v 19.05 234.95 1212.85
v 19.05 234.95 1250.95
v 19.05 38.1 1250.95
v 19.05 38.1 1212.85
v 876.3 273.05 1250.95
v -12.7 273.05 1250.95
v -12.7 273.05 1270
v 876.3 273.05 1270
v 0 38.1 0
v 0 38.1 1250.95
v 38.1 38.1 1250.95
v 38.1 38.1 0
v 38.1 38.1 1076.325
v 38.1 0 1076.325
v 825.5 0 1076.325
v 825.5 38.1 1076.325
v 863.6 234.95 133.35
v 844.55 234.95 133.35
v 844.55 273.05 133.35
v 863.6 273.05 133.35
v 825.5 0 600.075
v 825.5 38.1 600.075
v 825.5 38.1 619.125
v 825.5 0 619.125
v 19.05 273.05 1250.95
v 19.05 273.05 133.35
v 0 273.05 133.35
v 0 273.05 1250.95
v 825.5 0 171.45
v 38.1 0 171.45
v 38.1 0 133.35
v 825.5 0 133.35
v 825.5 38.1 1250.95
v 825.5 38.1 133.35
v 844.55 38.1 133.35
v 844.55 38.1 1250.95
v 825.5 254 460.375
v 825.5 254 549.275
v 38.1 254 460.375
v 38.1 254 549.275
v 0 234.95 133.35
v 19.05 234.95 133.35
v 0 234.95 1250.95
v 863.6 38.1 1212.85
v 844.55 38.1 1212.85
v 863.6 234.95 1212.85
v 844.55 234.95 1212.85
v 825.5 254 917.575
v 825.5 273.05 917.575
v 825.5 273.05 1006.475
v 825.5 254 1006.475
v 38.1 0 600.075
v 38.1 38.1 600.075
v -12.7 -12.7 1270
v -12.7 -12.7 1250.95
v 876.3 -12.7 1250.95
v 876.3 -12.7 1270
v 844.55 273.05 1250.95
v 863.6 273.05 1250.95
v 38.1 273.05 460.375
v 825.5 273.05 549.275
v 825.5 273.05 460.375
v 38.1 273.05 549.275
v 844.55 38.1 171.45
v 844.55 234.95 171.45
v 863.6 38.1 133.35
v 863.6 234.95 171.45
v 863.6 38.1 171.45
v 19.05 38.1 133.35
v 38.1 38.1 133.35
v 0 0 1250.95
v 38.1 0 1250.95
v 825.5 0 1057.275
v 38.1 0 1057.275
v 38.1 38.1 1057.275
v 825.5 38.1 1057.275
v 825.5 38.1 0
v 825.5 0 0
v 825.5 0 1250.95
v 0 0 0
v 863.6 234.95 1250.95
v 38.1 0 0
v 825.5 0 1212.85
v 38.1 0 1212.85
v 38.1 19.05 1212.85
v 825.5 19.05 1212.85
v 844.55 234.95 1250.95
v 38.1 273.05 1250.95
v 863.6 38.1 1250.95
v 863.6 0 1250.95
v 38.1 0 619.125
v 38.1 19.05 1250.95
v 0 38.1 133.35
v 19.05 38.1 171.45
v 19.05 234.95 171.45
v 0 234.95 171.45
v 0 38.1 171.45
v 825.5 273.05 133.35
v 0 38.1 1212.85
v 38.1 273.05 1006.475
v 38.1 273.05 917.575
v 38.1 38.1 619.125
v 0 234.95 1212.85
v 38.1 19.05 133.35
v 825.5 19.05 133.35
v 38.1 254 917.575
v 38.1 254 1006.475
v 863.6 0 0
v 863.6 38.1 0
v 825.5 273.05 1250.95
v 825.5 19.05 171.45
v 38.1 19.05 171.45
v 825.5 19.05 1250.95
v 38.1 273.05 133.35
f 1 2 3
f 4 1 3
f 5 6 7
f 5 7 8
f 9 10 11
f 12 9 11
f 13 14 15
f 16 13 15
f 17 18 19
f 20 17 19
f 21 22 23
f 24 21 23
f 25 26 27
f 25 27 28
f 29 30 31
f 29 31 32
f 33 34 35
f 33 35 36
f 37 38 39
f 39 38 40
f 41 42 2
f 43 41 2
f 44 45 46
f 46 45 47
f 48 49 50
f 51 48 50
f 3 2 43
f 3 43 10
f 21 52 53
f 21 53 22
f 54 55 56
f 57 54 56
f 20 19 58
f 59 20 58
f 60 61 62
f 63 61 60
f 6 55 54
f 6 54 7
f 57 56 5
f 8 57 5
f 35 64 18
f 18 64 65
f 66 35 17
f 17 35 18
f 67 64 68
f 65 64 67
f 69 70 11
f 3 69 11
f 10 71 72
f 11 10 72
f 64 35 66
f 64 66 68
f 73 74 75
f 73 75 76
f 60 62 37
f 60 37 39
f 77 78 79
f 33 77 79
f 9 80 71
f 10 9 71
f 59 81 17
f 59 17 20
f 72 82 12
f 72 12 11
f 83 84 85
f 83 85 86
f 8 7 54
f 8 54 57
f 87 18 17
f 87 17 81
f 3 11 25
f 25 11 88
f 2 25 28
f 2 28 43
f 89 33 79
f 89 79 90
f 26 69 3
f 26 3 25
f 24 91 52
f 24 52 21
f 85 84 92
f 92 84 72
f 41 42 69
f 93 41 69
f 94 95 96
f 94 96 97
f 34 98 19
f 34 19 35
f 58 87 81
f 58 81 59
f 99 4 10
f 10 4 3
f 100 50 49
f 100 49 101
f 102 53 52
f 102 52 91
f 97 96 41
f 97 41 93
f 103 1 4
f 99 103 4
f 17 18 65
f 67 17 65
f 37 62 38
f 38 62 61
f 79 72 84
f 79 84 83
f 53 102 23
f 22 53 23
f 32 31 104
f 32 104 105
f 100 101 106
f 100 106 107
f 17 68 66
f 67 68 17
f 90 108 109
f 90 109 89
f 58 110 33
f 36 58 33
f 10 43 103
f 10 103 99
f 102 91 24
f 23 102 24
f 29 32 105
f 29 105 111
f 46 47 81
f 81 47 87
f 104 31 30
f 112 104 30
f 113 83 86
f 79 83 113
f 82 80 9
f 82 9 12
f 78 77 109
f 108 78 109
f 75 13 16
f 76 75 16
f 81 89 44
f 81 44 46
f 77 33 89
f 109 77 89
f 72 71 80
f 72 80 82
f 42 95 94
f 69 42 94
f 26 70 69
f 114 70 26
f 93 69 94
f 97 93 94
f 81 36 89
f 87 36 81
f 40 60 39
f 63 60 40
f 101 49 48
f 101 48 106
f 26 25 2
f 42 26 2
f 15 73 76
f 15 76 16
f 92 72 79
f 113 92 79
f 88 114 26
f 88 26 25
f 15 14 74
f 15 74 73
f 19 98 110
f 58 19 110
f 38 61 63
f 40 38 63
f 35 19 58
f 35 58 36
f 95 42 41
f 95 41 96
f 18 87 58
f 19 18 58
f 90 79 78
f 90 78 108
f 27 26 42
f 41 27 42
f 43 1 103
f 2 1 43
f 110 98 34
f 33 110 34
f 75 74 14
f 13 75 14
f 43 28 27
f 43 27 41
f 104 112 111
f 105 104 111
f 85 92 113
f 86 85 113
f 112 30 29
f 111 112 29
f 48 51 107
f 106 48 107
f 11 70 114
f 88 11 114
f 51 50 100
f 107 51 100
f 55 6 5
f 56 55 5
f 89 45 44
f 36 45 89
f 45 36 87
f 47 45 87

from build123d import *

# Parameters (mm, degrees)
F0_W      = 38.1
F0_H      = 1250.95
F1_DEPTH  = 38.1
F2_W      = 234.95
F2_H      = 1117.6
F3_DEPTH  = 19.05
F4_W      = 38.1
F4_H      = 1117.6
F5_DEPTH  = 19.05
F6_W      = 196.85
F6_H      = 38.1
F7_DEPTH  = 19.05
F8_W      = 196.85
F8_H      = 38.1
F9_DEPTH  = 19.05
F10_W     = 38.1
F10_H     = 1250.95
F11_DEPTH = 38.1
F12_W     = 234.95
F12_H     = 1117.6
F13_DEPTH = 19.05
F14_W     = 38.1
F14_H     = 1117.6
F15_DEPTH = 19.05
F16_W     = 196.85
F16_H     = 38.1
F17_DEPTH = 19.05
F18_W     = 196.85
F18_H     = 38.1
F19_DEPTH = 19.05
F20_W     = 787.4
F20_H     = 38.1
F21_DEPTH = 19.05
F22_W     = 787.4
F22_H     = 38.1
F23_DEPTH = 19.05
F24_W     = 787.4
F24_H     = 19.05
F25_DEPTH = 38.1
F26_W     = 787.4
F26_H     = 19.05
F27_DEPTH = 38.1
F28_W     = 787.4
F28_H     = 88.9
F29_DEPTH = 19.05
F30_W     = 787.4
F30_H     = 88.9
F31_DEPTH = 19.05
F32_W     = 889
F32_H     = 285.75
F32_W_2   = 38.1
F32_H_2   = 38.1
F33_DEPTH = 19.05


with BuildPart() as f1:
    # F0 (on Front) → F1 (new body)
    with BuildSketch(Plane.XZ):
        with Locations((19.05, 625.475)):
            Rectangle(F0_W, F0_H)
    extrude(amount=-F1_DEPTH)


with BuildPart() as f3:
    # F2 (on face) → F3 (new body)
    with BuildSketch(Plane.YZ.offset(38.1)):
        with Locations((155.575, 692.15)):
            Rectangle(F2_W, F2_H)
    extrude(amount=-F3_DEPTH)


with BuildPart() as f5:
    # F4 (on face) → F5 (new body)
    with BuildSketch(Plane(origin=(19.05, 0, 0), x_dir=(0, -1, 0), z_dir=(-1, 0, 0))):
        with Locations((-254, 692.15)):
            Rectangle(F4_W, F4_H)
    extrude(amount=F5_DEPTH)


with BuildPart() as f7:
    # F6 (on face) → F7 (new body)
    with BuildSketch(Plane(origin=(19.05, 0, 0), x_dir=(0, -1, 0), z_dir=(-1, 0, 0))):
        with Locations((-136.525, 1231.9)):
            Rectangle(F6_W, F6_H)
    extrude(amount=F7_DEPTH)


with BuildPart() as f9:
    # F8 (on face) → F9 (new body)
    with BuildSketch(Plane(origin=(19.05, 0, 0), x_dir=(0, -1, 0), z_dir=(-1, 0, 0))):
        with Locations((-136.525, 152.4)):
            Rectangle(F8_W, F8_H)
    extrude(amount=F9_DEPTH)


with BuildPart() as f11:
    # F10 (on Front) → F11 (new body)
    with BuildSketch(Plane.XZ):
        with Locations((844.55, 625.475)):
            Rectangle(F10_W, F10_H)
    extrude(amount=-F11_DEPTH)


with BuildPart() as f13:
    # F12 (on face) → F13 (new body)
    with BuildSketch(Plane(origin=(825.5, 0, 0), x_dir=(0, -1, 0), z_dir=(-1, 0, 0))):
        with Locations((-155.575, 692.15)):
            Rectangle(F12_W, F12_H)
    extrude(amount=-F13_DEPTH)


with BuildPart() as f15:
    # F14 (on face) → F15 (new body)
    with BuildSketch(Plane.YZ.offset(844.55)):
        with Locations((254, 692.15)):
            Rectangle(F14_W, F14_H)
    extrude(amount=F15_DEPTH)


with BuildPart() as f17:
    # F16 (on face) → F17 (new body)
    with BuildSketch(Plane.YZ.offset(844.55)):
        with Locations((136.525, 1231.9)):
            Rectangle(F16_W, F16_H)
    extrude(amount=F17_DEPTH)


with BuildPart() as f19:
    # F18 (on face) → F19 (new body)
    with BuildSketch(Plane.YZ.offset(844.55)):
        with Locations((136.525, 152.4)):
            Rectangle(F18_W, F18_H)
    extrude(amount=F19_DEPTH)


with BuildPart() as f21:
    # F20 (on face) → F21 (new body)
    with BuildSketch(Plane.XZ):
        with Locations((431.8, 1231.9)):
            Rectangle(F20_W, F20_H)
    extrude(amount=-F21_DEPTH)


with BuildPart() as f23:
    # F22 (on face) → F23 (new body)
    with BuildSketch(Plane.XZ):
        with Locations((431.8, 152.4)):
            Rectangle(F22_W, F22_H)
    extrude(amount=-F23_DEPTH)


with BuildPart() as f25:
    # F24 (on face) → F25 (new body)
    with BuildSketch(Plane.XZ):
        with Locations((431.8, 609.6)):
            Rectangle(F24_W, F24_H)
    extrude(amount=-F25_DEPTH)


with BuildPart() as f27:
    # F26 (on face) → F27 (new body)
    with BuildSketch(Plane.XZ):
        with Locations((431.8, 1066.8)):
            Rectangle(F26_W, F26_H)
    extrude(amount=-F27_DEPTH)


with BuildPart() as f29:
    # F28 (on face) → F29 (new body)
    with BuildSketch(Plane(origin=(0, 273.05, 0), x_dir=(-1, 0, 0), z_dir=(0, 1, 0))):
        with Locations((-431.8, 962.025)):
            Rectangle(F28_W, F28_H)
    extrude(amount=-F29_DEPTH)


with BuildPart() as f31:
    # F30 (on face) → F31 (new body)
    with BuildSketch(Plane(origin=(0, 273.05, 0), x_dir=(-1, 0, 0), z_dir=(0, 1, 0))):
        with Locations((-431.8, 504.825)):
            Rectangle(F30_W, F30_H)
    extrude(amount=-F31_DEPTH)


with BuildPart() as f33:
    # F32 (on face) → F33 (new body)
    with BuildSketch(Plane.XY.offset(1250.95)):
        with Locations((431.8, 130.175)):
            Rectangle(F32_W, F32_H)
        with Locations((19.05, 19.05)):
            Rectangle(F32_W_2, F32_H_2, mode=Mode.SUBTRACT)
        with Locations((19.05, 19.05)):
            Rectangle(F32_W_2, F32_H_2)
    extrude(amount=F33_DEPTH)


solid = Compound([f1.part, f3.part, f5.part, f7.part, f9.part, f11.part, f13.part, f15.part, f17.part, f19.part, f21.part, f23.part, f25.part, f27.part, f29.part, f31.part, f33.part])
